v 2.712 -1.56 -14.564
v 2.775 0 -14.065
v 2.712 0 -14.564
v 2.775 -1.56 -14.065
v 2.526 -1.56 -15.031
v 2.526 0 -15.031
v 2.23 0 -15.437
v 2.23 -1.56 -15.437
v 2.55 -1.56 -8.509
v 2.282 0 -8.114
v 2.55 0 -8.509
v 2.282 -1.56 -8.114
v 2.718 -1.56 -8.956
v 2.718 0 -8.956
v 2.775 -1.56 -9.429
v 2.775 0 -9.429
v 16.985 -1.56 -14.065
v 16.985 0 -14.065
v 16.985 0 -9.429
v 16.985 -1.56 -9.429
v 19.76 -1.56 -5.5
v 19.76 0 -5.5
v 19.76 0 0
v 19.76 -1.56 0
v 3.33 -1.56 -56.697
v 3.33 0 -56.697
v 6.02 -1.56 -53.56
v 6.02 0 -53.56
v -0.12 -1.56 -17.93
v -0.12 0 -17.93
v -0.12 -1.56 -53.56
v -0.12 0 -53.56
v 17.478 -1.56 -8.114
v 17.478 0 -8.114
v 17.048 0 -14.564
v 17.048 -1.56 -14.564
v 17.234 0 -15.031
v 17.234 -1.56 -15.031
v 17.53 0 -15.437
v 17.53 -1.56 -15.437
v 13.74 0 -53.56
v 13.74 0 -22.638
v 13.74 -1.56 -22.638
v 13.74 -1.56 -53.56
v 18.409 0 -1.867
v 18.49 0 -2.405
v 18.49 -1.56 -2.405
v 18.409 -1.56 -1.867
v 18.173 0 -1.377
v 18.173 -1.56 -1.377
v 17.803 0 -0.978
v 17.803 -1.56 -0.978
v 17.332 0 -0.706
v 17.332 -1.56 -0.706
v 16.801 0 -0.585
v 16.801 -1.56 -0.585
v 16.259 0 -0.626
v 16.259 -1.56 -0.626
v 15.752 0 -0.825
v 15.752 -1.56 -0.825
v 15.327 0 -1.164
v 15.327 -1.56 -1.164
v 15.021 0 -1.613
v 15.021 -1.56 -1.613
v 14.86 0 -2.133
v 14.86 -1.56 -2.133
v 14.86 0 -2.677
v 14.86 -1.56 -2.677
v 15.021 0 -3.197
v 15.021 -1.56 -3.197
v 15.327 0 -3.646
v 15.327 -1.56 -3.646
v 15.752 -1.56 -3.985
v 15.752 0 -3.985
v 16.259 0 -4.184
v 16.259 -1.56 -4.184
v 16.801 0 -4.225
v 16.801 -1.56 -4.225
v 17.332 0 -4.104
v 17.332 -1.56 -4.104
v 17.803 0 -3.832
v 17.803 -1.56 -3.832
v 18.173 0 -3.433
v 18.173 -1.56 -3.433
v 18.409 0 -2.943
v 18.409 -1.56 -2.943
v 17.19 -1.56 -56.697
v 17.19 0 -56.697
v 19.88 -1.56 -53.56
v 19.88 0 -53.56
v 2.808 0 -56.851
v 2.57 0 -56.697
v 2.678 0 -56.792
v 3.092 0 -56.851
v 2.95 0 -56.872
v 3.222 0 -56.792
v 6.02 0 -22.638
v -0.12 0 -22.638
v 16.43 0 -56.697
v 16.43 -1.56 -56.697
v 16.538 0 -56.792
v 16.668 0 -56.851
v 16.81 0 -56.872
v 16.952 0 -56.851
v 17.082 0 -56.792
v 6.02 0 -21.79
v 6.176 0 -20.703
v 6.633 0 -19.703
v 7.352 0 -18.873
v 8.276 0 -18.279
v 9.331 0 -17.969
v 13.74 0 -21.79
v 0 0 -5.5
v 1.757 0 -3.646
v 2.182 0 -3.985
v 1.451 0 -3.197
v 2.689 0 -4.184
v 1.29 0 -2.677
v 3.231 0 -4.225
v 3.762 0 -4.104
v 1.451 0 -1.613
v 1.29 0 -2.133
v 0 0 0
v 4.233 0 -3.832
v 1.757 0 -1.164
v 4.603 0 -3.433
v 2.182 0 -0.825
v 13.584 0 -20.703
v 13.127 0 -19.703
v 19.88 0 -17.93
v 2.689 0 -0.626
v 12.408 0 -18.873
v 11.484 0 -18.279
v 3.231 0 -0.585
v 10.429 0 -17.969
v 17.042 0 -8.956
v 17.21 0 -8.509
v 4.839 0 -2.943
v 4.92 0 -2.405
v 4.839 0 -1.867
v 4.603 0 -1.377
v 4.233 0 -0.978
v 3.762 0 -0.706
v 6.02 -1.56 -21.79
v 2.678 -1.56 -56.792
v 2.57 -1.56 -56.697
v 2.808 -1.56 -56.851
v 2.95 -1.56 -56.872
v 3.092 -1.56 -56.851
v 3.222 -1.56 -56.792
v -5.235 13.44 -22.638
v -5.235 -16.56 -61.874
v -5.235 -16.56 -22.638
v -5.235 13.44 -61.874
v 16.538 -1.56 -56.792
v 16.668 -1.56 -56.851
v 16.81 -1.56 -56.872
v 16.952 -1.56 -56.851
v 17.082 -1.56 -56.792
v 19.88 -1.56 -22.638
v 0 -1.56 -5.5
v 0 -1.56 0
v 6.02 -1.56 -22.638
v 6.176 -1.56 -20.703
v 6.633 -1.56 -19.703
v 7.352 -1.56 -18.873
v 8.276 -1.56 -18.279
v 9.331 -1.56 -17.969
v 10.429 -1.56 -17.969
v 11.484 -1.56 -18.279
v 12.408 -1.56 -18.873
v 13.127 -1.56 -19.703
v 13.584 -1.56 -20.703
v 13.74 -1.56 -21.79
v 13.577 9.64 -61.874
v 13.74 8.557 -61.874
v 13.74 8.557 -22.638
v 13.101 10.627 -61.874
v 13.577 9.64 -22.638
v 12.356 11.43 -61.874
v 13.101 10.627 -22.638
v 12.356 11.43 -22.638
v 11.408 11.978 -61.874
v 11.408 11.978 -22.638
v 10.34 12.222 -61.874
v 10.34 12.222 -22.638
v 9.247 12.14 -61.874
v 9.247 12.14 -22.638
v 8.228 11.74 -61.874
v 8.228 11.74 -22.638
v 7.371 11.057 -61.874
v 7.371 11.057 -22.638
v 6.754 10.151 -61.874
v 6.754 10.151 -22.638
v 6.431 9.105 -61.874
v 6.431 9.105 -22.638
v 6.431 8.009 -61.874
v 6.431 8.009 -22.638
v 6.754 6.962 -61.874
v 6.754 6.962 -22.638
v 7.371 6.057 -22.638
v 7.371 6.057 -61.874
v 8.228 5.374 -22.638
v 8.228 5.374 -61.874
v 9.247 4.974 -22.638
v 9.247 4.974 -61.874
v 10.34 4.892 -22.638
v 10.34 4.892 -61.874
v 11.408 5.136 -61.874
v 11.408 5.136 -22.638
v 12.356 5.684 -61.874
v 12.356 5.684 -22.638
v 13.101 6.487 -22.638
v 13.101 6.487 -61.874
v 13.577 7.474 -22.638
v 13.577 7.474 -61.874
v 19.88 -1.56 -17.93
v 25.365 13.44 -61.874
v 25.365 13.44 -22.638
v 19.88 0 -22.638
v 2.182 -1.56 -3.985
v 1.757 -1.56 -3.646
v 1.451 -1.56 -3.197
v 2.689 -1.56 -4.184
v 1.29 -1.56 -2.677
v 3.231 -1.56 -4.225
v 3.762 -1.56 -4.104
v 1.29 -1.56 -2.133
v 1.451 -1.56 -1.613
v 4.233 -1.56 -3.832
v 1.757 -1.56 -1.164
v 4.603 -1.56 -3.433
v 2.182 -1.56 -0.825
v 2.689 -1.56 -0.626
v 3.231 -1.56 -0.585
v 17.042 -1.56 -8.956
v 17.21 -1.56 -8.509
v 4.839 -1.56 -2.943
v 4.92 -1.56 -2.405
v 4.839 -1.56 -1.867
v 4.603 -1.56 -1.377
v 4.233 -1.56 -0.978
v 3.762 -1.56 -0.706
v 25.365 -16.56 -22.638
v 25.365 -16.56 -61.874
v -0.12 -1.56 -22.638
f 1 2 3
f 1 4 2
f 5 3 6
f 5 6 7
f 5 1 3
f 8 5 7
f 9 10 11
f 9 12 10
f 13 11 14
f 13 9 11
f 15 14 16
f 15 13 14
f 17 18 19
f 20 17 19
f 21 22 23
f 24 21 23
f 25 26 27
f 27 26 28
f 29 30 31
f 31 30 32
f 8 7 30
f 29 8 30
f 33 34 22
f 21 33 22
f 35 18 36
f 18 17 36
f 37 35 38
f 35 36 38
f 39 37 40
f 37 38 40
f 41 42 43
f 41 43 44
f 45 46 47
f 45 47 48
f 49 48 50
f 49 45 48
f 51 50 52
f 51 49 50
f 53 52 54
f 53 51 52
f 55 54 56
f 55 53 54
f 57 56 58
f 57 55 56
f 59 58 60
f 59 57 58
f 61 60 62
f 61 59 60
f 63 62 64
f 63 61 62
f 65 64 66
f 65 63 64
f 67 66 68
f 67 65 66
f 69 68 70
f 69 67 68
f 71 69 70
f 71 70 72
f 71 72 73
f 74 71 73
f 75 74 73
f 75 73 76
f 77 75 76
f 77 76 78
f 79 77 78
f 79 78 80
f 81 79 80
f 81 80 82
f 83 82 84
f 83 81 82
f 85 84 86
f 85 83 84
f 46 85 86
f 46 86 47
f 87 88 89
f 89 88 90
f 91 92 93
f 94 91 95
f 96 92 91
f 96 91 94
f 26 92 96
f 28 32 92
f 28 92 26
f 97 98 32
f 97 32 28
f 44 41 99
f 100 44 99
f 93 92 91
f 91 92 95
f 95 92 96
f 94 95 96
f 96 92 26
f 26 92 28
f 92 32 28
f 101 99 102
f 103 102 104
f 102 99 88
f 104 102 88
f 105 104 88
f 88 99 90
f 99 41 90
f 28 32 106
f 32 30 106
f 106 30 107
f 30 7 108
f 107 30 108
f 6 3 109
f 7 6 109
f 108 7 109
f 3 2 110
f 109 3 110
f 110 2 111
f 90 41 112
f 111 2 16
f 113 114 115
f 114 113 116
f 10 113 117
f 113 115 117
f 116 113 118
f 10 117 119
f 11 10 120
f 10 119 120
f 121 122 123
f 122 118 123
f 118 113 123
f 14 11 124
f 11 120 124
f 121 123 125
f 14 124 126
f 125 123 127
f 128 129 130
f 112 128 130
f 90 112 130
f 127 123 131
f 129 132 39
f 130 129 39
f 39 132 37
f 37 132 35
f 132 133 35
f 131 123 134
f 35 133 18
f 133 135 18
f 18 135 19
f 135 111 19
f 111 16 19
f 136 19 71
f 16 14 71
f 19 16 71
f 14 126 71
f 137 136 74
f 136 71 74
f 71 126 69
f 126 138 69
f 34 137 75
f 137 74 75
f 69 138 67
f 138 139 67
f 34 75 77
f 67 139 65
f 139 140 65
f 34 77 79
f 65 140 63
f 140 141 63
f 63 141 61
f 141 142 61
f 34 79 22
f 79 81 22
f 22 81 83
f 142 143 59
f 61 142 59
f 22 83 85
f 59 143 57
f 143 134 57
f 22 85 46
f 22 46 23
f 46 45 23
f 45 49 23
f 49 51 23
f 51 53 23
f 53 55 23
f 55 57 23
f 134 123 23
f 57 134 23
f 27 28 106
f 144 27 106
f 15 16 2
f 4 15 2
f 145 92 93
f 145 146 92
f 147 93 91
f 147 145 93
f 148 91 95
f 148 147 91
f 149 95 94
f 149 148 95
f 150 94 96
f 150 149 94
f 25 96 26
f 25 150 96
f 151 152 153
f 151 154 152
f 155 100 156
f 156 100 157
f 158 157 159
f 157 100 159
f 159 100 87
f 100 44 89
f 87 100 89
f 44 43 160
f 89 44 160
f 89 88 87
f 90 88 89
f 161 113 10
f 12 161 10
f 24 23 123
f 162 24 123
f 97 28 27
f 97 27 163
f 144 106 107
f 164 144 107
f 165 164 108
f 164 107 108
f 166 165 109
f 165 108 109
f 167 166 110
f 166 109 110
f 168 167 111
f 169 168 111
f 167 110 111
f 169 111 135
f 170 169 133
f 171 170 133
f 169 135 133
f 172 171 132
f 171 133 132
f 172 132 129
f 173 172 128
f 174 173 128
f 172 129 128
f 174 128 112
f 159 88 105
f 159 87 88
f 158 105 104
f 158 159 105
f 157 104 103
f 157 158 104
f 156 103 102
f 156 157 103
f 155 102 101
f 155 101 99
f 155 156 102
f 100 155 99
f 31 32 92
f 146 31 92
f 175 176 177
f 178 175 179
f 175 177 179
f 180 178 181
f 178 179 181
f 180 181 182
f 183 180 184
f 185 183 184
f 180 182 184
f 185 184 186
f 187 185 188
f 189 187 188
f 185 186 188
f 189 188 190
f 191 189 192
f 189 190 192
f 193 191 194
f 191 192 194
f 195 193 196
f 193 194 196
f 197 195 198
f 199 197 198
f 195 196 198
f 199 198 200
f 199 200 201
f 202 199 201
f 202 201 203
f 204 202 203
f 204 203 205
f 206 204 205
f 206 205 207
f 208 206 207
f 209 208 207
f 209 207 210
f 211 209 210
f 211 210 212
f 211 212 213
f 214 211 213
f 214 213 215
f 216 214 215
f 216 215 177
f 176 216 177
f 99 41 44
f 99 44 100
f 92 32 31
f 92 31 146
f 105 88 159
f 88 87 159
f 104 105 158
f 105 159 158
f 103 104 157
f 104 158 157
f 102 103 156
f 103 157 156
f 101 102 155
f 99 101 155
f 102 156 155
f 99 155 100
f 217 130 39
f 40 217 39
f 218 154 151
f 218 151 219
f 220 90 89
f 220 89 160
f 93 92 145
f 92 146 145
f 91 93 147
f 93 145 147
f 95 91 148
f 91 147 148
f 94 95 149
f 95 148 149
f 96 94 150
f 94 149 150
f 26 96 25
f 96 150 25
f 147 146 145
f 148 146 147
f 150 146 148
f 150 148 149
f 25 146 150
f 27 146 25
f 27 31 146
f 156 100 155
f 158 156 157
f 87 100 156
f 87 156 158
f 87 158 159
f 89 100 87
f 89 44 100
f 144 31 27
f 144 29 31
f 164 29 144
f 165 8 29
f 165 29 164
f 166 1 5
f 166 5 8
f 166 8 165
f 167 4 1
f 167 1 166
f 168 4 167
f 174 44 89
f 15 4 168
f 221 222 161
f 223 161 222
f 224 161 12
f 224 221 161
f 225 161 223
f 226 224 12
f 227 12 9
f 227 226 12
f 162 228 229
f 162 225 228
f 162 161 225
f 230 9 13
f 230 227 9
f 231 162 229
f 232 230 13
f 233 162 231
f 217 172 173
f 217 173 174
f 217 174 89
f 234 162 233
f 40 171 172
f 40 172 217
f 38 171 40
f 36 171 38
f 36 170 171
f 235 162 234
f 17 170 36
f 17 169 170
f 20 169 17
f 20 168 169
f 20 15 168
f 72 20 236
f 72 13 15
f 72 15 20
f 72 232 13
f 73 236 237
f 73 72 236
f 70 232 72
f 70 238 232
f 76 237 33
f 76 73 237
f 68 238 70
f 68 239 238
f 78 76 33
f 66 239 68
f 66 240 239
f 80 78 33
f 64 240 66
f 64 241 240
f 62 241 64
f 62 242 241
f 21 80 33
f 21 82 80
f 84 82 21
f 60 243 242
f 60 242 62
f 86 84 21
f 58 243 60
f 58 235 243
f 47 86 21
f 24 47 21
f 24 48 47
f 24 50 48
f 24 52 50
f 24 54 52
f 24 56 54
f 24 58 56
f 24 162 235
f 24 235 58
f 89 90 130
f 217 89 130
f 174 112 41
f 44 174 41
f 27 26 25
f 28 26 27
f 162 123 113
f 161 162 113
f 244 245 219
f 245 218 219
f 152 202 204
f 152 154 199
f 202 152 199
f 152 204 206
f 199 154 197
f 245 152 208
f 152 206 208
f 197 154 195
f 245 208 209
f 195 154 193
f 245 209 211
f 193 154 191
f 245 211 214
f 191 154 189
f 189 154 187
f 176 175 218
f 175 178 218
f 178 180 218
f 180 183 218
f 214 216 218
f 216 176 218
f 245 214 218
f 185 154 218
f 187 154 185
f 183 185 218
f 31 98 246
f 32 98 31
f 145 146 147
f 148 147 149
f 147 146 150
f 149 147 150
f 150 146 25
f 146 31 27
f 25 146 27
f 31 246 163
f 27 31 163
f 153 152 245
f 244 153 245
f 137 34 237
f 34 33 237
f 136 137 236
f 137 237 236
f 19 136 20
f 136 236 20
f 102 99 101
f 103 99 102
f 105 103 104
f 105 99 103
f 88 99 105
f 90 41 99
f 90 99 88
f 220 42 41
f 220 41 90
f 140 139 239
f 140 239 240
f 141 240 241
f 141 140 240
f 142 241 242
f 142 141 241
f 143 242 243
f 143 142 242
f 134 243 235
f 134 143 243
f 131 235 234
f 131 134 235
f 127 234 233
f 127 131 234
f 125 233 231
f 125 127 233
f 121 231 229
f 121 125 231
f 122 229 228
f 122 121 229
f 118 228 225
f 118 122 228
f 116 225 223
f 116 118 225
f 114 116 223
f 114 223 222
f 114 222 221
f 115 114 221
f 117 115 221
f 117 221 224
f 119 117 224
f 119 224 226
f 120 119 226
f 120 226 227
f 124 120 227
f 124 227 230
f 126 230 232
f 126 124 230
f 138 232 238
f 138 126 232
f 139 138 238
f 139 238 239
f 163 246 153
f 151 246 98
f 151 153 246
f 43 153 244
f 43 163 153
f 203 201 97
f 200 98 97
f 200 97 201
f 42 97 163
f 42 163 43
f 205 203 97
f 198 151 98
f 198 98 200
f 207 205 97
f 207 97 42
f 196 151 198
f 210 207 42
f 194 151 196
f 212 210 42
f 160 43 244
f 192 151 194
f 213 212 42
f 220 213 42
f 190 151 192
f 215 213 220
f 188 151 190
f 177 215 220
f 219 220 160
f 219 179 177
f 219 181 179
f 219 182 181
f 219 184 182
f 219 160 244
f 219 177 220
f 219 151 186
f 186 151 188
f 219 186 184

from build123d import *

# Parameters (mm, degrees)
F0_R          = 1.825
F1_DEPTH      = 1.56
F2_R          = 2
F3_R          = 0.5
F4_W          = 30.5997557007
F4_H          = 39.236785844
F5_DEPTH      = 15
F5_DEPTH_BACK = 15
F7_R          = 3.6749201005
F8_DEPTH      = 54.4


with BuildPart() as f1:
    # F0 (on Front) → F1 (new body)
    with BuildSketch(Plane.XZ):
        with BuildLine():
            Line((19.76, 0), (0, 0))
            Line((0, 0), (0, -5.5))
            Line((0, -5.5), (2.775, -8.679432))
            Line((2.775, -8.679432), (2.775, -14.859432))
            Line((2.775, -14.859432), (-0.12, -17.93))
            Line((-0.12, -17.93), (-0.12, -53.56))
            Line((-0.12, -53.56), (2.95, -57.14))
            Line((2.95, -57.14), (6.02, -53.56))
            Line((6.02, -53.56), (6.02, -21.79))
            ThreePointArc((6.02, -21.79), (9.88, -17.93), (13.74, -21.79))
            Line((13.74, -21.79), (13.74, -53.56))
            Line((13.74, -53.56), (16.81, -57.14))
            Line((16.81, -57.14), (19.88, -53.56))
            Line((19.88, -53.56), (19.88, -17.93))
            Line((19.88, -17.93), (16.985, -14.859432))
            Line((16.985, -14.859432), (16.985, -8.679432))
            Line((16.985, -8.679432), (19.76, -5.5))
            Line((19.76, -5.5), (19.76, 0))
        make_face()
        with Locations((3.095, -2.405)):
            Circle(F0_R, mode=Mode.SUBTRACT)
        with Locations((16.665, -2.405)):
            Circle(F0_R, mode=Mode.SUBTRACT)
    extrude(amount=F1_DEPTH)

    # F2
    f2_edges = [f1.edges().sort_by_distance(p)[0] for p in [
        (2.775, -0.78, -8.679432),
        (2.775, -0.78, -14.859432),
        (16.985, -0.78, -8.679432),
        (16.985, -0.78, -14.859432),
    ]]
    fillet(f2_edges, radius=F2_R)

    # F3
    f3_edges = [f1.edges().sort_by_distance(p)[0] for p in [
        (2.95, -0.78, -57.14),
        (16.81, -0.78, -57.14),
    ]]
    fillet(f3_edges, radius=F3_R)


with BuildPart() as f5:
    # F4 (on face) → F5 (new body, two sides)
    with BuildSketch(Plane.XZ.offset(1.56)) as f5_sk:
        with Locations((10.0650798995, -42.2559035942)):
            Rectangle(F4_W, F4_H)
    extrude(amount=-F5_DEPTH)
    extrude(f5_sk.sketch, amount=F5_DEPTH_BACK)

    # F6: cut F1
    add(f1.part, mode=Mode.SUBTRACT)

    # F7 (on face) → F8 (cut)
    with BuildSketch(Plane.XY.offset(-22.6375106722)):
        with Locations((10.0650798995, 8.5569592193)):
            Circle(F7_R)
    extrude(amount=-F8_DEPTH, mode=Mode.SUBTRACT)


solid = Compound([f1.part, f5.part])
